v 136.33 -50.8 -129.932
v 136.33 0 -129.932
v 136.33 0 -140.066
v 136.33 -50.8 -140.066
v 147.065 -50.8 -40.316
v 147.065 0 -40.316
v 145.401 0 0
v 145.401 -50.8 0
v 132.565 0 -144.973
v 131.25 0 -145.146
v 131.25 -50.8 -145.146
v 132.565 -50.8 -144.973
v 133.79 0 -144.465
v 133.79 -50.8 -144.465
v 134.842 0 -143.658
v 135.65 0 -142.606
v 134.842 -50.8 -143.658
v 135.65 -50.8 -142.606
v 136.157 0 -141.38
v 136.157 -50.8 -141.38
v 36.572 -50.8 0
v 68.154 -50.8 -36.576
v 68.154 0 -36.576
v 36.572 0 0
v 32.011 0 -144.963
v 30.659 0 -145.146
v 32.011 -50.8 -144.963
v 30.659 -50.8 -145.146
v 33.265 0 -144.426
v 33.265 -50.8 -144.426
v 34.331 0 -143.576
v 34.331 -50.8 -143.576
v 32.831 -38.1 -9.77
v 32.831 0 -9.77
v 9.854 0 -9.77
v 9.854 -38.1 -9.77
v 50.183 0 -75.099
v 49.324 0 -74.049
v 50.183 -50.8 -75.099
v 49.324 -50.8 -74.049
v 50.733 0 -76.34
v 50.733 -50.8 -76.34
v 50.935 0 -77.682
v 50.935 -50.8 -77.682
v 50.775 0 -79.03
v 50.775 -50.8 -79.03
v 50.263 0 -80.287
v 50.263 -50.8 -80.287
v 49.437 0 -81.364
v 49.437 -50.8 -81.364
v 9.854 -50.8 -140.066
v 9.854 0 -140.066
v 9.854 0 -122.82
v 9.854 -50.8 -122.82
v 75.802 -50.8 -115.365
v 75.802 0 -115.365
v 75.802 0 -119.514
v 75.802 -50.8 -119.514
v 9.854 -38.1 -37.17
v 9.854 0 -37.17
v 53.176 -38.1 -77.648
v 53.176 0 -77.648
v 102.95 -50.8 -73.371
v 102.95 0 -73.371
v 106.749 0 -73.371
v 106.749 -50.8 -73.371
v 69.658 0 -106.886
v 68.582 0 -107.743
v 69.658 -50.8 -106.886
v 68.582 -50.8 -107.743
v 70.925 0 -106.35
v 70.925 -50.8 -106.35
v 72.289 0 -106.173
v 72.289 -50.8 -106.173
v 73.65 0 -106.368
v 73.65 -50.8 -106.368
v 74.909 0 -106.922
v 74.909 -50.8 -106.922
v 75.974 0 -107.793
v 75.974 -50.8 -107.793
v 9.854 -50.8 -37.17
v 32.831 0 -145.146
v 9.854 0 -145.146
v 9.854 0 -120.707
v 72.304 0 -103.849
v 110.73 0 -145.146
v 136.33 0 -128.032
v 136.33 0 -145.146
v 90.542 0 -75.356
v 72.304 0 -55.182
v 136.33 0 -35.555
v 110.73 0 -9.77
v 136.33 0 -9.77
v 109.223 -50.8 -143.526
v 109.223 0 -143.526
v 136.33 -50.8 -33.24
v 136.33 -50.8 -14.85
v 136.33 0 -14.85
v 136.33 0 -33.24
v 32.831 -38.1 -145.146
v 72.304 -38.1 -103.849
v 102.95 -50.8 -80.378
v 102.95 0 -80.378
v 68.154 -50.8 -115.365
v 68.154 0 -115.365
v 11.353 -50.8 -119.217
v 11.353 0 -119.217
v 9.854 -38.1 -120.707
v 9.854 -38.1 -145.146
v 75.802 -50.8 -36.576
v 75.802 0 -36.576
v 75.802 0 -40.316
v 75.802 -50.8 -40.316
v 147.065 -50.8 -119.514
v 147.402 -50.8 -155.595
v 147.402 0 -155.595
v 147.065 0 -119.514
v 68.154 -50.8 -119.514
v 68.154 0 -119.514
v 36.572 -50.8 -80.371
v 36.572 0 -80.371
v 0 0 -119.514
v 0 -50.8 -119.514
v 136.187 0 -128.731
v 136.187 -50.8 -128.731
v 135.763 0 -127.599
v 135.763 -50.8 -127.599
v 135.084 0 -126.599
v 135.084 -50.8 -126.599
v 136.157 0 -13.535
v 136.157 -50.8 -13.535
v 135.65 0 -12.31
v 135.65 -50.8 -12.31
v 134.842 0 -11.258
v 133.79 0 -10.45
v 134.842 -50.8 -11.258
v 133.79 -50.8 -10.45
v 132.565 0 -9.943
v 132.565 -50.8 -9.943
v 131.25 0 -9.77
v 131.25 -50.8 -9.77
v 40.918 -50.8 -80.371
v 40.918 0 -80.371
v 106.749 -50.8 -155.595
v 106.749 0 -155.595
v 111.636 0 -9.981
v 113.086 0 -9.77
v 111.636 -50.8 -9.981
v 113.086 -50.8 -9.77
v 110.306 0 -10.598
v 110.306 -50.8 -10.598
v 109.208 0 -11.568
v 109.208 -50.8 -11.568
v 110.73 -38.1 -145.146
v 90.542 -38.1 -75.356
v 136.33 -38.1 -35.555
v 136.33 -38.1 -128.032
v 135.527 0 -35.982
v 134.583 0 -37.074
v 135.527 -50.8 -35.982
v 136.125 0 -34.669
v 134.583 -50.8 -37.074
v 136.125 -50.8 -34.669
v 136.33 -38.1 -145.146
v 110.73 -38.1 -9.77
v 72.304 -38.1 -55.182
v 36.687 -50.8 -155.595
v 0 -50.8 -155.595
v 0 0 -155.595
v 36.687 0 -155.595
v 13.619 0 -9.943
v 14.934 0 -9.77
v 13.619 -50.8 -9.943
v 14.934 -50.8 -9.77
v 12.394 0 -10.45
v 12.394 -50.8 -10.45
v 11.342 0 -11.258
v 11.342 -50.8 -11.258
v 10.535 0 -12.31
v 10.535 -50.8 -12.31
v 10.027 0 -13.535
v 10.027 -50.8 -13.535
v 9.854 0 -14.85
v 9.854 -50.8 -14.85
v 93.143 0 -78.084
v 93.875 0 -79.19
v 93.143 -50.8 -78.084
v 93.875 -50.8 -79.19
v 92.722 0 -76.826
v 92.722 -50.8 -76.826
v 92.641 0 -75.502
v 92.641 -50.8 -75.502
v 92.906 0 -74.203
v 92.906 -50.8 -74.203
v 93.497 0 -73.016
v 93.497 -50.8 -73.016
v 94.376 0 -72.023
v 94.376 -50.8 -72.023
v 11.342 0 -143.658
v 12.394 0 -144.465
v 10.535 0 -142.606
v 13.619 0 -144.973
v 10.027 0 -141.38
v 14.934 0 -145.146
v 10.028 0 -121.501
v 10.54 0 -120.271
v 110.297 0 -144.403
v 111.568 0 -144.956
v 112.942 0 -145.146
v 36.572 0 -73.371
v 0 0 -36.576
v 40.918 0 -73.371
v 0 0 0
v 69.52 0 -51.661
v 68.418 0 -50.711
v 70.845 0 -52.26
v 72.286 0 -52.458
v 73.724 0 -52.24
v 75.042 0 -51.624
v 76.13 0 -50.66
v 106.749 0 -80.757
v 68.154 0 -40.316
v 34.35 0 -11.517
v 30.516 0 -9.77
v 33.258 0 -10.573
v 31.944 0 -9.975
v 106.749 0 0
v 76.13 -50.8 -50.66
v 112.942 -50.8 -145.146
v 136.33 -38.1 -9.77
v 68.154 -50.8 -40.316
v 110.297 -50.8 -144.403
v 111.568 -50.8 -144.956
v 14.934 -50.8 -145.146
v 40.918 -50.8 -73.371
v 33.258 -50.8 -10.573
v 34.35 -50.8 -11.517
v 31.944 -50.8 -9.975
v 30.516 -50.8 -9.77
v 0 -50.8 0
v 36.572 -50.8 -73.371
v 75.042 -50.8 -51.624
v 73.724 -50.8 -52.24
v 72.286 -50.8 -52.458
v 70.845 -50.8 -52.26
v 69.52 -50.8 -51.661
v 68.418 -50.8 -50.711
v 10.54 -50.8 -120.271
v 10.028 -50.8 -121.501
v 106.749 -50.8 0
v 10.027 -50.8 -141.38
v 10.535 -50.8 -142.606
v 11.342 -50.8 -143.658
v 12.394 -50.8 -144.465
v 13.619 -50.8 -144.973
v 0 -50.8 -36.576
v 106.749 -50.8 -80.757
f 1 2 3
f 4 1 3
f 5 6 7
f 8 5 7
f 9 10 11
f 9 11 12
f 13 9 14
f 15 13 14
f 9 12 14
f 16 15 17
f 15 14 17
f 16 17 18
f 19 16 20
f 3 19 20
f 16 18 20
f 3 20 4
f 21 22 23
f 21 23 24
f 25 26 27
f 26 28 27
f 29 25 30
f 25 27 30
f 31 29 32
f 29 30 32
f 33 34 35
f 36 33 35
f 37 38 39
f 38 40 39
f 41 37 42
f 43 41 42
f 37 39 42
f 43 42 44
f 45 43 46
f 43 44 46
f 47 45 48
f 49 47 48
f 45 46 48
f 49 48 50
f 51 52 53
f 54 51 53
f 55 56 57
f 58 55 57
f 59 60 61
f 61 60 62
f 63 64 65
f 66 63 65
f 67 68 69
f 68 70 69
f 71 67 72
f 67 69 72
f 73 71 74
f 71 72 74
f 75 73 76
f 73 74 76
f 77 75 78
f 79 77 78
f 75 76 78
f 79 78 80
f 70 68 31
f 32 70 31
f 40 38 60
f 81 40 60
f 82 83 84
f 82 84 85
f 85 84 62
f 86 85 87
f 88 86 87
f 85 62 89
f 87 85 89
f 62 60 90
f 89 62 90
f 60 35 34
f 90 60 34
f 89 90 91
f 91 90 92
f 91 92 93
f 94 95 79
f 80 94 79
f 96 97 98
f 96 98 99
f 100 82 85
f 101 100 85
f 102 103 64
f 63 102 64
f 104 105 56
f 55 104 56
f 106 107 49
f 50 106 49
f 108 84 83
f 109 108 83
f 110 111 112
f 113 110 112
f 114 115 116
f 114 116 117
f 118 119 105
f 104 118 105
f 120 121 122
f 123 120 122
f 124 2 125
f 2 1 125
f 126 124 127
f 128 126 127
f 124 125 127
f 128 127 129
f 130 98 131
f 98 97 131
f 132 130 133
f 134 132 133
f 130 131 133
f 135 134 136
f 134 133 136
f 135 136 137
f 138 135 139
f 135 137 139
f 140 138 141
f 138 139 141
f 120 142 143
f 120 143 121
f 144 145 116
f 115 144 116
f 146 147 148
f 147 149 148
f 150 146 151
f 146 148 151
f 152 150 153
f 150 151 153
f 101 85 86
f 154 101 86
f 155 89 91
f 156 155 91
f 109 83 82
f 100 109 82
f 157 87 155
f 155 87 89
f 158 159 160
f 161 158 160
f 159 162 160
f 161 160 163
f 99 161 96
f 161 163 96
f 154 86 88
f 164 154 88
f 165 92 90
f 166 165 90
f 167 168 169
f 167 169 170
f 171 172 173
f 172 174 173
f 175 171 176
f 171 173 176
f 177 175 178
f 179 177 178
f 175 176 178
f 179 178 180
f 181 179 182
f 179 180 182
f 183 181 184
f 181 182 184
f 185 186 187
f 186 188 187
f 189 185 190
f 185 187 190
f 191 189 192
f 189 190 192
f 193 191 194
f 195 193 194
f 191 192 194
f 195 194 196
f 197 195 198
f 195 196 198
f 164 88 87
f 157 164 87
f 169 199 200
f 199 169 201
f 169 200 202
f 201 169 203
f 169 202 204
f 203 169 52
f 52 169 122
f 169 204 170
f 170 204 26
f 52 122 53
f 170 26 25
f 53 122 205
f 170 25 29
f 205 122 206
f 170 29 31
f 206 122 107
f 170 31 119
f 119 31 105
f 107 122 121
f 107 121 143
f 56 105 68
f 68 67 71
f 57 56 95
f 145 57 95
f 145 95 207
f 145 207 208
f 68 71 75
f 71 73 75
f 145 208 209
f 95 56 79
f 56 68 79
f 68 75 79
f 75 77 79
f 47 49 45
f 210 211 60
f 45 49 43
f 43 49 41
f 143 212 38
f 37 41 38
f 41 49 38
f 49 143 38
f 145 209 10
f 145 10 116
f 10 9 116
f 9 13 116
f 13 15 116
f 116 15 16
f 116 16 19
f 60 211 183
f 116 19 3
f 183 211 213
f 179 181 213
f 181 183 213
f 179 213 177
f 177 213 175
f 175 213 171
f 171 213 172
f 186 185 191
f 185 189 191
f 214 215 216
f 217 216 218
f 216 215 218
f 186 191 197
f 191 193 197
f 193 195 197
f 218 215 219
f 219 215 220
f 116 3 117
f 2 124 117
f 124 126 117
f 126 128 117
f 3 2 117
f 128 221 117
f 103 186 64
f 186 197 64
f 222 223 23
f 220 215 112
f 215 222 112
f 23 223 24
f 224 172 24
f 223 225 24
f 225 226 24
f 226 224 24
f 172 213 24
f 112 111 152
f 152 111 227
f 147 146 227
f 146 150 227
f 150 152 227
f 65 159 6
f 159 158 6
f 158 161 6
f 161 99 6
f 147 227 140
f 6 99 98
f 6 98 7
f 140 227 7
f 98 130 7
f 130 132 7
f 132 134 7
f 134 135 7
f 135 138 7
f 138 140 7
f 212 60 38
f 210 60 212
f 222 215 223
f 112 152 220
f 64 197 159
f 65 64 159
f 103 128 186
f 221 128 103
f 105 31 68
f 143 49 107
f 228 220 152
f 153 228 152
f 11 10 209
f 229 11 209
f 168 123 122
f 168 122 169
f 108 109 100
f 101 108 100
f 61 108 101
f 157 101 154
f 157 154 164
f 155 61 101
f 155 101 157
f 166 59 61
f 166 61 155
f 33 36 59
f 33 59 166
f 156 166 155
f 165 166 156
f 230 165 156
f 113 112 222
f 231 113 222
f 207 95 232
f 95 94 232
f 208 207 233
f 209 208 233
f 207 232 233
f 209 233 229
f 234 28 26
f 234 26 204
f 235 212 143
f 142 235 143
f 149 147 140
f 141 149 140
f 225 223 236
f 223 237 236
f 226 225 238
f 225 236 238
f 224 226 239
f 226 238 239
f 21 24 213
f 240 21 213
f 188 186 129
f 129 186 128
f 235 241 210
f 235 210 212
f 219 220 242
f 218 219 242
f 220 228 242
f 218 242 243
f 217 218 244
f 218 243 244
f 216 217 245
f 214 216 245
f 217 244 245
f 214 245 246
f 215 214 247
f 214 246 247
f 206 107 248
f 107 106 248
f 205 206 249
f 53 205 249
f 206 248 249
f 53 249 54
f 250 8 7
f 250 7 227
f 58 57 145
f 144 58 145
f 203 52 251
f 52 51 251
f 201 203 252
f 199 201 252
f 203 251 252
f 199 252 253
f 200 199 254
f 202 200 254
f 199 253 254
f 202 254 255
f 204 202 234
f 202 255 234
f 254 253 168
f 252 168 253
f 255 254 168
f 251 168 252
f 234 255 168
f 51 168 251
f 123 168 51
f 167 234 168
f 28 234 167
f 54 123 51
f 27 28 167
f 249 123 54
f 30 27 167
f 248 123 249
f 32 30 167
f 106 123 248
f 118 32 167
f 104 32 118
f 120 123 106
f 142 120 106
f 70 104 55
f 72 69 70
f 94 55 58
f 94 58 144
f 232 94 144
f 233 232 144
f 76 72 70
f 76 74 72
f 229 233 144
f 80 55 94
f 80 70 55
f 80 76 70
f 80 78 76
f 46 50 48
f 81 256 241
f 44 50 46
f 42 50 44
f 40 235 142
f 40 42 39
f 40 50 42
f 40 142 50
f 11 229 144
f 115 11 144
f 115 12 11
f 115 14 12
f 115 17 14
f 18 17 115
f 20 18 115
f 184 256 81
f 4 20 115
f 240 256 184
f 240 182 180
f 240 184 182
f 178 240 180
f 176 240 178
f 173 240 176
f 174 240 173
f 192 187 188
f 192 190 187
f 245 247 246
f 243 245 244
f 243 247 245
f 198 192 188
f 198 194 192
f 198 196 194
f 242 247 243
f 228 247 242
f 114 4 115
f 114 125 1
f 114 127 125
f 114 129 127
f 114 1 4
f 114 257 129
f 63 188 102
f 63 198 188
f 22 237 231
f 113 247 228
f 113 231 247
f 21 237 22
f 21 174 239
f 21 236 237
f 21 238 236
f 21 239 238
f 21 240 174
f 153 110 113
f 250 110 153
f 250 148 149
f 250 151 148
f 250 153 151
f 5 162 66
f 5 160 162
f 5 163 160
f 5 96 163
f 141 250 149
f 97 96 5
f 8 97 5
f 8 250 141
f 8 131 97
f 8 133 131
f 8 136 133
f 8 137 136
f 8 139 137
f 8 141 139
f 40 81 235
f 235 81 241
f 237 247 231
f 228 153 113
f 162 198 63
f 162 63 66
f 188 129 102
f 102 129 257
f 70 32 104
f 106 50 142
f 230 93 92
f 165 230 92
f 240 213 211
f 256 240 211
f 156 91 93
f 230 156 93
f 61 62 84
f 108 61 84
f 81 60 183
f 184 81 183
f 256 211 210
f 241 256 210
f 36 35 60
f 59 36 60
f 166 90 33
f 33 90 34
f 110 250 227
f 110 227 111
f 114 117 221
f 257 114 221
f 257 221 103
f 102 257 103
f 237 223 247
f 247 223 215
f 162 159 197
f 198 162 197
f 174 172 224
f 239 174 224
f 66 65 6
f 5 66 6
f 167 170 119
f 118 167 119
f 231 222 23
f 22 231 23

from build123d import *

# Parameters (mm, degrees)
F1_DEPTH = 50.8
F2_DEPTH = 38.1
F3_R     = 5.08


with BuildPart() as f1:
    # F0 (on Front) → F1 (new body)
    with BuildSketch(Plane.XZ):
        Polygon((36.572117, 0), (0, 0), (0, -36.575612), (36.572117, -73.370636), (40.917668, -73.370636), (40.917668, -80.371439), (36.572117, -80.371439), (0, -119.51381), (0, -155.595407), (36.687225, -155.595407), (68.154112, -119.51381), (68.154112, -115.364969), (75.802006, -115.364969), (75.802006, -119.51381), (106.74908, -155.595407), (147.401795, -155.595407), (147.064805, -119.51381), (106.74908, -80.756798), (102.949895, -80.377825), (102.949895, -73.370636), (106.74908, -73.370636), (147.064805, -40.315568), (145.401269, 0), (106.74908, 0), (75.802006, -36.575612), (75.802006, -40.315568), (68.154112, -40.315568), (68.154112, -36.575612), align=None)
        Polygon((9.854002, -37.170373), (9.854002, -9.769688), (32.830928, -9.769688), (72.304286, -55.181518), (110.729687, -9.769688), (136.330321, -9.769688), (136.330321, -35.55505), (90.542087, -75.355591), (136.330321, -128.032322), (136.330321, -145.14567), (110.729687, -145.14567), (72.304286, -103.848994), (32.830928, -145.14567), (9.854002, -145.14567), (9.854002, -120.707072), (53.175925, -77.647596), align=None, mode=Mode.SUBTRACT)
    extrude(amount=F1_DEPTH)

    # F3
    f3_edges = [f1.edges().sort_by_distance(p)[0] for p in [
        (9.854002, -25.4, -9.769688),
        (32.830928, -25.4, -9.769688),
        (53.175925, -25.4, -77.647596),
        (72.304286, -25.4, -55.181518),
        (110.729687, -25.4, -9.769688),
        (136.330321, -25.4, -9.769688),
        (136.330321, -25.4, -35.55505),
        (90.542087, -25.4, -75.355591),
        (9.854002, -25.4, -120.707072),
        (72.304286, -25.4, -103.848994),
        (110.729687, -25.4, -145.14567),
        (9.854002, -25.4, -145.14567),
        (32.830928, -25.4, -145.14567),
        (136.330321, -25.4, -128.032322),
        (136.330321, -25.4, -145.14567),
    ]]
    fillet(f3_edges, radius=F3_R)


with BuildPart() as f2:
    # F0 (on Front) → F2 (new body)
    with BuildSketch(Plane.XZ):
        Polygon((32.830928, -9.769688), (9.854002, -9.769688), (9.854002, -37.170373), (53.175925, -77.647596), (9.854002, -120.707072), (9.854002, -145.14567), (32.830928, -145.14567), (72.304286, -103.848994), (110.729687, -145.14567), (136.330321, -145.14567), (136.330321, -128.032322), (90.542087, -75.355591), (136.330321, -35.55505), (136.330321, -9.769688), (110.729687, -9.769688), (72.304286, -55.181518), align=None)
    extrude(amount=F2_DEPTH)


solid = Compound([f1.part, f2.part])
